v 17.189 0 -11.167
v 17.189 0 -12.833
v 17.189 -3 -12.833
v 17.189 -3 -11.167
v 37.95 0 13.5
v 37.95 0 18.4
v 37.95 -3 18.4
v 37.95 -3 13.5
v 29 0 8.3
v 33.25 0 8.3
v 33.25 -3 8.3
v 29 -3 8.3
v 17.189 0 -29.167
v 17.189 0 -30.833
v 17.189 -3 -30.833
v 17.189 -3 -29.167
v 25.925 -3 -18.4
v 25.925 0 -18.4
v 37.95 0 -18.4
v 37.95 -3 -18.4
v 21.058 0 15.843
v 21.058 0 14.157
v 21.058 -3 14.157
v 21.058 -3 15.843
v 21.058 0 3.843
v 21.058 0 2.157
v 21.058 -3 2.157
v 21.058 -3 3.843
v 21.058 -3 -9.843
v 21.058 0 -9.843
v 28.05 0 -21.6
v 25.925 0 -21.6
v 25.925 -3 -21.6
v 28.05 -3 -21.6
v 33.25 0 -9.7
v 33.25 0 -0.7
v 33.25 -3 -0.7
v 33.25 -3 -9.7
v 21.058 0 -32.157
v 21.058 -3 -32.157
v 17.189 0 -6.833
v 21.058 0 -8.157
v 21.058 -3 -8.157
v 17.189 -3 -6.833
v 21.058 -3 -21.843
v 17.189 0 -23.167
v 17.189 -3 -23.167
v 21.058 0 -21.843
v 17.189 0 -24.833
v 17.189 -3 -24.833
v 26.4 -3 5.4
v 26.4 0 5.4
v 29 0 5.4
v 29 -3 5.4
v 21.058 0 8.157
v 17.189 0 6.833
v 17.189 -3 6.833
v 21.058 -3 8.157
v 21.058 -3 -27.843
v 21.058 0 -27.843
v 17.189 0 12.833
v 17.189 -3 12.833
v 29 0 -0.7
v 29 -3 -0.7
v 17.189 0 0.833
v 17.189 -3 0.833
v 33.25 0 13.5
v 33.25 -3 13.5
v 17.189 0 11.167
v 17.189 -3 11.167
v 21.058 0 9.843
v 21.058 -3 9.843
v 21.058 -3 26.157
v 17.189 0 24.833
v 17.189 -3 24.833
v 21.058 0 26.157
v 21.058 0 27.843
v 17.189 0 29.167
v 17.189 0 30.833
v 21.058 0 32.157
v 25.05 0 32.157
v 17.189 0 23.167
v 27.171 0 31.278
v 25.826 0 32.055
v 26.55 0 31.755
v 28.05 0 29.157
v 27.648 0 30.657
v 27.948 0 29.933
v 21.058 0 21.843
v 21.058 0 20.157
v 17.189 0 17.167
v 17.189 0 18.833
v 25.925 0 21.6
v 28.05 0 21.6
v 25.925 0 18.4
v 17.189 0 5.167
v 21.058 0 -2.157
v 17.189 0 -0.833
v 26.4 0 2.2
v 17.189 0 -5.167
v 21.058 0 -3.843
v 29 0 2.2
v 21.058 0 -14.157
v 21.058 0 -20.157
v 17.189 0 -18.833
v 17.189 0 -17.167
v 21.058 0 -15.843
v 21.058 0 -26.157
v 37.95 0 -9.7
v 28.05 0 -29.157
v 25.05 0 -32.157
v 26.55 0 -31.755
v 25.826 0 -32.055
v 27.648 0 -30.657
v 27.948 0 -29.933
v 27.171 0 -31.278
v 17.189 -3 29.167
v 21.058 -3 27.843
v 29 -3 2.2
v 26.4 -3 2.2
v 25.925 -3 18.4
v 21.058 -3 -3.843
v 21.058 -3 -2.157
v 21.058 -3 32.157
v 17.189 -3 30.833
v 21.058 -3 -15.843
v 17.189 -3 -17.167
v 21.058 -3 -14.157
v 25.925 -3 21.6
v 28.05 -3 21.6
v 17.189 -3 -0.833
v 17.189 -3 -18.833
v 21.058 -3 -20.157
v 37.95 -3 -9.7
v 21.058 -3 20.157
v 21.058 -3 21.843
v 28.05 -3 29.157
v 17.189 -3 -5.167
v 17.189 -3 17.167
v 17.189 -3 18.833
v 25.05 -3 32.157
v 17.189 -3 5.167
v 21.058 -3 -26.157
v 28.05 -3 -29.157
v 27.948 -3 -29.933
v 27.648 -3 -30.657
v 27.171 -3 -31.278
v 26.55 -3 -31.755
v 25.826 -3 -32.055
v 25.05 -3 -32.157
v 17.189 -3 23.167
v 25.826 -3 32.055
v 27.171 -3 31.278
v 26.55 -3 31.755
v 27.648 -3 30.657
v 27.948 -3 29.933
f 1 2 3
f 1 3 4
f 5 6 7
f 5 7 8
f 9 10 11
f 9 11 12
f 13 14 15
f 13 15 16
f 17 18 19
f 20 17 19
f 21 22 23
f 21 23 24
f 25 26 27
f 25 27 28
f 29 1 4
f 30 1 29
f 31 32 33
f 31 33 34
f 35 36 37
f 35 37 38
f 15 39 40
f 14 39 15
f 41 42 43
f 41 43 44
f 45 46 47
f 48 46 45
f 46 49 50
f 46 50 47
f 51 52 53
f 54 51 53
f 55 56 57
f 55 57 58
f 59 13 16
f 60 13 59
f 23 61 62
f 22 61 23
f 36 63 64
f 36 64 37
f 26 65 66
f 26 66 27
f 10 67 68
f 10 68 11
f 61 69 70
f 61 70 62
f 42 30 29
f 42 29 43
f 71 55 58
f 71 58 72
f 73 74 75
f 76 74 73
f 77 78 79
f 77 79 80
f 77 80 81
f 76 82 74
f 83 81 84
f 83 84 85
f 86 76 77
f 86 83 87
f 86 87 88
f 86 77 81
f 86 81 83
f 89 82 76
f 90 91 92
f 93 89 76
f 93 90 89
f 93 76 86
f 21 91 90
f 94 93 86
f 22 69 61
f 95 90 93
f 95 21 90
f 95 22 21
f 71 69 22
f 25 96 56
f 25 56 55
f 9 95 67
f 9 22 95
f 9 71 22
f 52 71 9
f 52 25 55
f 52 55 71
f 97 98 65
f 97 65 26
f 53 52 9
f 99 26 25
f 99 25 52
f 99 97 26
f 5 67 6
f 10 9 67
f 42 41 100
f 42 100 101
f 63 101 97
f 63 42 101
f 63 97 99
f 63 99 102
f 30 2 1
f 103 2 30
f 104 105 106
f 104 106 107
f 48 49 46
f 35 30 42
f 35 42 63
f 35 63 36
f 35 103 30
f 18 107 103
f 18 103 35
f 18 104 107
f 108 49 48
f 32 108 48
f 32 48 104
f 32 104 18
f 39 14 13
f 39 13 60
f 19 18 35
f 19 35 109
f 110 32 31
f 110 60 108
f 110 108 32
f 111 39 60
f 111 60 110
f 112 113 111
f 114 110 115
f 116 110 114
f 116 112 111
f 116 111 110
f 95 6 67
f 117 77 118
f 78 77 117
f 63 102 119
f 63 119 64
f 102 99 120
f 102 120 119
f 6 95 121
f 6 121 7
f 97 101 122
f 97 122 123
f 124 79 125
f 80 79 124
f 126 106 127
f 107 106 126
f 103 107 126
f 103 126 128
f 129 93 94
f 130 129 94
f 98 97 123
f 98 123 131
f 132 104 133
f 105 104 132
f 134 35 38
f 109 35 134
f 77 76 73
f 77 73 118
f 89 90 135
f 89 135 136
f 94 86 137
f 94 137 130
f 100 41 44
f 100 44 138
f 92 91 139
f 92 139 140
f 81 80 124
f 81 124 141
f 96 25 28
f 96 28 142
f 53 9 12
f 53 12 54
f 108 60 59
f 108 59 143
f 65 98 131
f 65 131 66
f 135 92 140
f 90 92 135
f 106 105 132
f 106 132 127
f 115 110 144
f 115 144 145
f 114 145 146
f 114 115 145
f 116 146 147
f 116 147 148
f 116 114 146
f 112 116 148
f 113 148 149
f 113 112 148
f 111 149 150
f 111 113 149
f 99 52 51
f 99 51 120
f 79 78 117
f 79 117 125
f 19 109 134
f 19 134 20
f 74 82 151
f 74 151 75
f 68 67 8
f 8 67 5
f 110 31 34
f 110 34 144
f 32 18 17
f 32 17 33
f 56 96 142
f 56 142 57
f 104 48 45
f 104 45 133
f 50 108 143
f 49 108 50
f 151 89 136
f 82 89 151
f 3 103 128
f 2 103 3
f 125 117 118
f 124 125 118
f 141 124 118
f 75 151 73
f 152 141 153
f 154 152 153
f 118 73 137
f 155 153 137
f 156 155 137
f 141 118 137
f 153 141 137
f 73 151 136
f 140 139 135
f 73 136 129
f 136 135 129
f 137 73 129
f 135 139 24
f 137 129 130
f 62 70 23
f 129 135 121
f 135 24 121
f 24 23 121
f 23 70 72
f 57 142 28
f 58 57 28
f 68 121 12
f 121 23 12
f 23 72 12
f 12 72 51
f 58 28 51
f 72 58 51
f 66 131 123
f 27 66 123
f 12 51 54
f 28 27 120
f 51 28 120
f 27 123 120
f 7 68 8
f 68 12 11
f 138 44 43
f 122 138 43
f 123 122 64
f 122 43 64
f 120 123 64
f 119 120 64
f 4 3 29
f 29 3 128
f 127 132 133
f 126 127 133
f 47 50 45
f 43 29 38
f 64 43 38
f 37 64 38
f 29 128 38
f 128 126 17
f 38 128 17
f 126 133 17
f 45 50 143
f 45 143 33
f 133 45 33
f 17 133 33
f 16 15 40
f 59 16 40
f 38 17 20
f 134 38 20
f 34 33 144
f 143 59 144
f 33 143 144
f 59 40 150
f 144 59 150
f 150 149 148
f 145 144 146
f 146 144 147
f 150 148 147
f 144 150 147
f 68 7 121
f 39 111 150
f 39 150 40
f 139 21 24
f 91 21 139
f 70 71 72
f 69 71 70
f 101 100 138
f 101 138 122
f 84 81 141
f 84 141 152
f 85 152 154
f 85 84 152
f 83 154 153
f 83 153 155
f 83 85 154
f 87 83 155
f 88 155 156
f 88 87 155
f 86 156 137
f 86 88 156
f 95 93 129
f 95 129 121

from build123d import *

# Parameters (mm, degrees)
BOSS_EXTRUDE1_DEPTH = 3
SKETCH4_W           = 12.125
SKETCH4_H           = 3.2
SKETCH4_W_2         = 4.8
SKETCH4_H_2         = 23.2
SKETCH4_W_3         = 2.7
CUT_EXTRUDE1_DEPTH  = 4


with BuildPart() as part:
    # Sketch1 → Boss-Extrude1 (new body)
    with BuildSketch(Plane(origin=(0, 0, 0), x_dir=(1, 0, 0), z_dir=(0, 1, 0))):
        with BuildLine():
            Line((37.95, 21.5), (28.05, 21.5))
            Line((28.05, 21.5), (28.05, 29.157009142))
            ThreePointArc((28.05, 29.157009142), (27.171320344, 31.278329486), (25.05, 32.157009142))
            Line((25.05, 32.157009142), (21.058452488, 32.157009142))
            Line((21.058452488, 32.157009142), (17.188733854, 30.83348742))
            Line((17.188733854, 30.83348742), (17.188733854, 29.16651258))
            Line((17.188733854, 29.16651258), (21.058452488, 27.842990858))
            Line((21.058452488, 27.842990858), (21.058452488, 26.157009142))
            Line((21.058452488, 26.157009142), (17.188733854, 24.83348742))
            Line((17.188733854, 24.83348742), (17.188733854, 23.16651258))
            Line((17.188733854, 23.16651258), (21.058452488, 21.842990858))
            Line((21.058452488, 21.842990858), (21.058452488, 20.157009142))
            Line((21.058452488, 20.157009142), (17.188733854, 18.83348742))
            Line((17.188733854, 18.83348742), (17.188733854, 17.16651258))
            Line((17.188733854, 17.16651258), (21.058452488, 15.842990858))
            Line((21.058452488, 15.842990858), (21.058452488, 14.157009142))
            Line((21.058452488, 14.157009142), (17.188733854, 12.83348742))
            Line((17.188733854, 12.83348742), (17.188733854, 11.16651258))
            Line((17.188733854, 11.16651258), (21.058452488, 9.842990858))
            Line((21.058452488, 9.842990858), (21.058452488, 8.157009142))
            Line((21.058452488, 8.157009142), (17.188733854, 6.83348742))
            Line((17.188733854, 6.83348742), (17.188733854, 5.16651258))
            Line((17.188733854, 5.16651258), (21.058452488, 3.842990858))
            Line((21.058452488, 3.842990858), (21.058452488, 2.157009142))
            Line((21.058452488, 2.157009142), (17.188733854, 0.83348742))
            Line((17.188733854, 0.83348742), (17.188733854, -0.83348742))
            Line((17.188733854, -0.83348742), (21.058452488, -2.157009142))
            Line((21.058452488, -2.157009142), (21.058452488, -3.842990858))
            Line((21.058452488, -3.842990858), (17.188733854, -5.16651258))
            Line((17.188733854, -5.16651258), (17.188733854, -6.83348742))
            Line((17.188733854, -6.83348742), (21.058452488, -8.157009142))
            Line((21.058452488, -8.157009142), (21.058452488, -9.842990858))
            Line((21.058452488, -9.842990858), (17.188733854, -11.16651258))
            Line((17.188733854, -11.16651258), (17.188733854, -12.83348742))
            Line((17.188733854, -12.83348742), (21.058452488, -14.157009142))
            Line((21.058452488, -14.157009142), (21.058452488, -15.842990858))
            Line((21.058452488, -15.842990858), (17.188733854, -17.16651258))
            Line((17.188733854, -17.16651258), (17.188733854, -18.83348742))
            Line((17.188733854, -18.83348742), (21.058452488, -20.157009142))
            Line((21.058452488, -20.157009142), (21.058452488, -21.842990858))
            Line((21.058452488, -21.842990858), (17.188733854, -23.16651258))
            Line((17.188733854, -23.16651258), (17.188733854, -24.83348742))
            Line((17.188733854, -24.83348742), (21.058452488, -26.157009142))
            Line((21.058452488, -26.157009142), (21.058452488, -27.842990858))
            Line((21.058452488, -27.842990858), (17.188733854, -29.16651258))
            Line((17.188733854, -29.16651258), (17.188733854, -30.83348742))
            Line((17.188733854, -30.83348742), (21.058452488, -32.157009142))
            Line((21.058452488, -32.157009142), (25.05, -32.157009142))
            ThreePointArc((25.05, -32.157009142), (27.171320344, -31.278329486), (28.05, -29.157009142))
            Line((28.05, -29.157009142), (28.05, -21.5))
            Line((28.05, -21.5), (37.95, -21.5))
            Line((37.95, -21.5), (37.95, -8.3))
            Line((37.95, -8.3), (29, -8.3))
            Line((29, -8.3), (29, 0.7))
            Line((29, 0.7), (37.95, 0.7))
            Line((37.95, 0.7), (37.95, 21.5))
        make_face()
    extrude(amount=-BOSS_EXTRUDE1_DEPTH)

    # Sketch4 → Cut-Extrude1 (cut, through all)
    with BuildSketch(Plane(origin=(0, 0, 0), x_dir=(1, 0, 0), z_dir=(0, 1, 0))):
        with Locations((31.9875, -20)):
            Rectangle(SKETCH4_W, SKETCH4_H)
        with Locations((35.65, -1.9)):
            Rectangle(SKETCH4_W_2, SKETCH4_H_2)
        with Locations((31.9875, 20)):
            Rectangle(SKETCH4_W, SKETCH4_H)
        with Locations((27.75, -3.8)):
            Rectangle(SKETCH4_W_3, SKETCH4_H)
    extrude(amount=-CUT_EXTRUDE1_DEPTH, mode=Mode.SUBTRACT)


solid = part.part
